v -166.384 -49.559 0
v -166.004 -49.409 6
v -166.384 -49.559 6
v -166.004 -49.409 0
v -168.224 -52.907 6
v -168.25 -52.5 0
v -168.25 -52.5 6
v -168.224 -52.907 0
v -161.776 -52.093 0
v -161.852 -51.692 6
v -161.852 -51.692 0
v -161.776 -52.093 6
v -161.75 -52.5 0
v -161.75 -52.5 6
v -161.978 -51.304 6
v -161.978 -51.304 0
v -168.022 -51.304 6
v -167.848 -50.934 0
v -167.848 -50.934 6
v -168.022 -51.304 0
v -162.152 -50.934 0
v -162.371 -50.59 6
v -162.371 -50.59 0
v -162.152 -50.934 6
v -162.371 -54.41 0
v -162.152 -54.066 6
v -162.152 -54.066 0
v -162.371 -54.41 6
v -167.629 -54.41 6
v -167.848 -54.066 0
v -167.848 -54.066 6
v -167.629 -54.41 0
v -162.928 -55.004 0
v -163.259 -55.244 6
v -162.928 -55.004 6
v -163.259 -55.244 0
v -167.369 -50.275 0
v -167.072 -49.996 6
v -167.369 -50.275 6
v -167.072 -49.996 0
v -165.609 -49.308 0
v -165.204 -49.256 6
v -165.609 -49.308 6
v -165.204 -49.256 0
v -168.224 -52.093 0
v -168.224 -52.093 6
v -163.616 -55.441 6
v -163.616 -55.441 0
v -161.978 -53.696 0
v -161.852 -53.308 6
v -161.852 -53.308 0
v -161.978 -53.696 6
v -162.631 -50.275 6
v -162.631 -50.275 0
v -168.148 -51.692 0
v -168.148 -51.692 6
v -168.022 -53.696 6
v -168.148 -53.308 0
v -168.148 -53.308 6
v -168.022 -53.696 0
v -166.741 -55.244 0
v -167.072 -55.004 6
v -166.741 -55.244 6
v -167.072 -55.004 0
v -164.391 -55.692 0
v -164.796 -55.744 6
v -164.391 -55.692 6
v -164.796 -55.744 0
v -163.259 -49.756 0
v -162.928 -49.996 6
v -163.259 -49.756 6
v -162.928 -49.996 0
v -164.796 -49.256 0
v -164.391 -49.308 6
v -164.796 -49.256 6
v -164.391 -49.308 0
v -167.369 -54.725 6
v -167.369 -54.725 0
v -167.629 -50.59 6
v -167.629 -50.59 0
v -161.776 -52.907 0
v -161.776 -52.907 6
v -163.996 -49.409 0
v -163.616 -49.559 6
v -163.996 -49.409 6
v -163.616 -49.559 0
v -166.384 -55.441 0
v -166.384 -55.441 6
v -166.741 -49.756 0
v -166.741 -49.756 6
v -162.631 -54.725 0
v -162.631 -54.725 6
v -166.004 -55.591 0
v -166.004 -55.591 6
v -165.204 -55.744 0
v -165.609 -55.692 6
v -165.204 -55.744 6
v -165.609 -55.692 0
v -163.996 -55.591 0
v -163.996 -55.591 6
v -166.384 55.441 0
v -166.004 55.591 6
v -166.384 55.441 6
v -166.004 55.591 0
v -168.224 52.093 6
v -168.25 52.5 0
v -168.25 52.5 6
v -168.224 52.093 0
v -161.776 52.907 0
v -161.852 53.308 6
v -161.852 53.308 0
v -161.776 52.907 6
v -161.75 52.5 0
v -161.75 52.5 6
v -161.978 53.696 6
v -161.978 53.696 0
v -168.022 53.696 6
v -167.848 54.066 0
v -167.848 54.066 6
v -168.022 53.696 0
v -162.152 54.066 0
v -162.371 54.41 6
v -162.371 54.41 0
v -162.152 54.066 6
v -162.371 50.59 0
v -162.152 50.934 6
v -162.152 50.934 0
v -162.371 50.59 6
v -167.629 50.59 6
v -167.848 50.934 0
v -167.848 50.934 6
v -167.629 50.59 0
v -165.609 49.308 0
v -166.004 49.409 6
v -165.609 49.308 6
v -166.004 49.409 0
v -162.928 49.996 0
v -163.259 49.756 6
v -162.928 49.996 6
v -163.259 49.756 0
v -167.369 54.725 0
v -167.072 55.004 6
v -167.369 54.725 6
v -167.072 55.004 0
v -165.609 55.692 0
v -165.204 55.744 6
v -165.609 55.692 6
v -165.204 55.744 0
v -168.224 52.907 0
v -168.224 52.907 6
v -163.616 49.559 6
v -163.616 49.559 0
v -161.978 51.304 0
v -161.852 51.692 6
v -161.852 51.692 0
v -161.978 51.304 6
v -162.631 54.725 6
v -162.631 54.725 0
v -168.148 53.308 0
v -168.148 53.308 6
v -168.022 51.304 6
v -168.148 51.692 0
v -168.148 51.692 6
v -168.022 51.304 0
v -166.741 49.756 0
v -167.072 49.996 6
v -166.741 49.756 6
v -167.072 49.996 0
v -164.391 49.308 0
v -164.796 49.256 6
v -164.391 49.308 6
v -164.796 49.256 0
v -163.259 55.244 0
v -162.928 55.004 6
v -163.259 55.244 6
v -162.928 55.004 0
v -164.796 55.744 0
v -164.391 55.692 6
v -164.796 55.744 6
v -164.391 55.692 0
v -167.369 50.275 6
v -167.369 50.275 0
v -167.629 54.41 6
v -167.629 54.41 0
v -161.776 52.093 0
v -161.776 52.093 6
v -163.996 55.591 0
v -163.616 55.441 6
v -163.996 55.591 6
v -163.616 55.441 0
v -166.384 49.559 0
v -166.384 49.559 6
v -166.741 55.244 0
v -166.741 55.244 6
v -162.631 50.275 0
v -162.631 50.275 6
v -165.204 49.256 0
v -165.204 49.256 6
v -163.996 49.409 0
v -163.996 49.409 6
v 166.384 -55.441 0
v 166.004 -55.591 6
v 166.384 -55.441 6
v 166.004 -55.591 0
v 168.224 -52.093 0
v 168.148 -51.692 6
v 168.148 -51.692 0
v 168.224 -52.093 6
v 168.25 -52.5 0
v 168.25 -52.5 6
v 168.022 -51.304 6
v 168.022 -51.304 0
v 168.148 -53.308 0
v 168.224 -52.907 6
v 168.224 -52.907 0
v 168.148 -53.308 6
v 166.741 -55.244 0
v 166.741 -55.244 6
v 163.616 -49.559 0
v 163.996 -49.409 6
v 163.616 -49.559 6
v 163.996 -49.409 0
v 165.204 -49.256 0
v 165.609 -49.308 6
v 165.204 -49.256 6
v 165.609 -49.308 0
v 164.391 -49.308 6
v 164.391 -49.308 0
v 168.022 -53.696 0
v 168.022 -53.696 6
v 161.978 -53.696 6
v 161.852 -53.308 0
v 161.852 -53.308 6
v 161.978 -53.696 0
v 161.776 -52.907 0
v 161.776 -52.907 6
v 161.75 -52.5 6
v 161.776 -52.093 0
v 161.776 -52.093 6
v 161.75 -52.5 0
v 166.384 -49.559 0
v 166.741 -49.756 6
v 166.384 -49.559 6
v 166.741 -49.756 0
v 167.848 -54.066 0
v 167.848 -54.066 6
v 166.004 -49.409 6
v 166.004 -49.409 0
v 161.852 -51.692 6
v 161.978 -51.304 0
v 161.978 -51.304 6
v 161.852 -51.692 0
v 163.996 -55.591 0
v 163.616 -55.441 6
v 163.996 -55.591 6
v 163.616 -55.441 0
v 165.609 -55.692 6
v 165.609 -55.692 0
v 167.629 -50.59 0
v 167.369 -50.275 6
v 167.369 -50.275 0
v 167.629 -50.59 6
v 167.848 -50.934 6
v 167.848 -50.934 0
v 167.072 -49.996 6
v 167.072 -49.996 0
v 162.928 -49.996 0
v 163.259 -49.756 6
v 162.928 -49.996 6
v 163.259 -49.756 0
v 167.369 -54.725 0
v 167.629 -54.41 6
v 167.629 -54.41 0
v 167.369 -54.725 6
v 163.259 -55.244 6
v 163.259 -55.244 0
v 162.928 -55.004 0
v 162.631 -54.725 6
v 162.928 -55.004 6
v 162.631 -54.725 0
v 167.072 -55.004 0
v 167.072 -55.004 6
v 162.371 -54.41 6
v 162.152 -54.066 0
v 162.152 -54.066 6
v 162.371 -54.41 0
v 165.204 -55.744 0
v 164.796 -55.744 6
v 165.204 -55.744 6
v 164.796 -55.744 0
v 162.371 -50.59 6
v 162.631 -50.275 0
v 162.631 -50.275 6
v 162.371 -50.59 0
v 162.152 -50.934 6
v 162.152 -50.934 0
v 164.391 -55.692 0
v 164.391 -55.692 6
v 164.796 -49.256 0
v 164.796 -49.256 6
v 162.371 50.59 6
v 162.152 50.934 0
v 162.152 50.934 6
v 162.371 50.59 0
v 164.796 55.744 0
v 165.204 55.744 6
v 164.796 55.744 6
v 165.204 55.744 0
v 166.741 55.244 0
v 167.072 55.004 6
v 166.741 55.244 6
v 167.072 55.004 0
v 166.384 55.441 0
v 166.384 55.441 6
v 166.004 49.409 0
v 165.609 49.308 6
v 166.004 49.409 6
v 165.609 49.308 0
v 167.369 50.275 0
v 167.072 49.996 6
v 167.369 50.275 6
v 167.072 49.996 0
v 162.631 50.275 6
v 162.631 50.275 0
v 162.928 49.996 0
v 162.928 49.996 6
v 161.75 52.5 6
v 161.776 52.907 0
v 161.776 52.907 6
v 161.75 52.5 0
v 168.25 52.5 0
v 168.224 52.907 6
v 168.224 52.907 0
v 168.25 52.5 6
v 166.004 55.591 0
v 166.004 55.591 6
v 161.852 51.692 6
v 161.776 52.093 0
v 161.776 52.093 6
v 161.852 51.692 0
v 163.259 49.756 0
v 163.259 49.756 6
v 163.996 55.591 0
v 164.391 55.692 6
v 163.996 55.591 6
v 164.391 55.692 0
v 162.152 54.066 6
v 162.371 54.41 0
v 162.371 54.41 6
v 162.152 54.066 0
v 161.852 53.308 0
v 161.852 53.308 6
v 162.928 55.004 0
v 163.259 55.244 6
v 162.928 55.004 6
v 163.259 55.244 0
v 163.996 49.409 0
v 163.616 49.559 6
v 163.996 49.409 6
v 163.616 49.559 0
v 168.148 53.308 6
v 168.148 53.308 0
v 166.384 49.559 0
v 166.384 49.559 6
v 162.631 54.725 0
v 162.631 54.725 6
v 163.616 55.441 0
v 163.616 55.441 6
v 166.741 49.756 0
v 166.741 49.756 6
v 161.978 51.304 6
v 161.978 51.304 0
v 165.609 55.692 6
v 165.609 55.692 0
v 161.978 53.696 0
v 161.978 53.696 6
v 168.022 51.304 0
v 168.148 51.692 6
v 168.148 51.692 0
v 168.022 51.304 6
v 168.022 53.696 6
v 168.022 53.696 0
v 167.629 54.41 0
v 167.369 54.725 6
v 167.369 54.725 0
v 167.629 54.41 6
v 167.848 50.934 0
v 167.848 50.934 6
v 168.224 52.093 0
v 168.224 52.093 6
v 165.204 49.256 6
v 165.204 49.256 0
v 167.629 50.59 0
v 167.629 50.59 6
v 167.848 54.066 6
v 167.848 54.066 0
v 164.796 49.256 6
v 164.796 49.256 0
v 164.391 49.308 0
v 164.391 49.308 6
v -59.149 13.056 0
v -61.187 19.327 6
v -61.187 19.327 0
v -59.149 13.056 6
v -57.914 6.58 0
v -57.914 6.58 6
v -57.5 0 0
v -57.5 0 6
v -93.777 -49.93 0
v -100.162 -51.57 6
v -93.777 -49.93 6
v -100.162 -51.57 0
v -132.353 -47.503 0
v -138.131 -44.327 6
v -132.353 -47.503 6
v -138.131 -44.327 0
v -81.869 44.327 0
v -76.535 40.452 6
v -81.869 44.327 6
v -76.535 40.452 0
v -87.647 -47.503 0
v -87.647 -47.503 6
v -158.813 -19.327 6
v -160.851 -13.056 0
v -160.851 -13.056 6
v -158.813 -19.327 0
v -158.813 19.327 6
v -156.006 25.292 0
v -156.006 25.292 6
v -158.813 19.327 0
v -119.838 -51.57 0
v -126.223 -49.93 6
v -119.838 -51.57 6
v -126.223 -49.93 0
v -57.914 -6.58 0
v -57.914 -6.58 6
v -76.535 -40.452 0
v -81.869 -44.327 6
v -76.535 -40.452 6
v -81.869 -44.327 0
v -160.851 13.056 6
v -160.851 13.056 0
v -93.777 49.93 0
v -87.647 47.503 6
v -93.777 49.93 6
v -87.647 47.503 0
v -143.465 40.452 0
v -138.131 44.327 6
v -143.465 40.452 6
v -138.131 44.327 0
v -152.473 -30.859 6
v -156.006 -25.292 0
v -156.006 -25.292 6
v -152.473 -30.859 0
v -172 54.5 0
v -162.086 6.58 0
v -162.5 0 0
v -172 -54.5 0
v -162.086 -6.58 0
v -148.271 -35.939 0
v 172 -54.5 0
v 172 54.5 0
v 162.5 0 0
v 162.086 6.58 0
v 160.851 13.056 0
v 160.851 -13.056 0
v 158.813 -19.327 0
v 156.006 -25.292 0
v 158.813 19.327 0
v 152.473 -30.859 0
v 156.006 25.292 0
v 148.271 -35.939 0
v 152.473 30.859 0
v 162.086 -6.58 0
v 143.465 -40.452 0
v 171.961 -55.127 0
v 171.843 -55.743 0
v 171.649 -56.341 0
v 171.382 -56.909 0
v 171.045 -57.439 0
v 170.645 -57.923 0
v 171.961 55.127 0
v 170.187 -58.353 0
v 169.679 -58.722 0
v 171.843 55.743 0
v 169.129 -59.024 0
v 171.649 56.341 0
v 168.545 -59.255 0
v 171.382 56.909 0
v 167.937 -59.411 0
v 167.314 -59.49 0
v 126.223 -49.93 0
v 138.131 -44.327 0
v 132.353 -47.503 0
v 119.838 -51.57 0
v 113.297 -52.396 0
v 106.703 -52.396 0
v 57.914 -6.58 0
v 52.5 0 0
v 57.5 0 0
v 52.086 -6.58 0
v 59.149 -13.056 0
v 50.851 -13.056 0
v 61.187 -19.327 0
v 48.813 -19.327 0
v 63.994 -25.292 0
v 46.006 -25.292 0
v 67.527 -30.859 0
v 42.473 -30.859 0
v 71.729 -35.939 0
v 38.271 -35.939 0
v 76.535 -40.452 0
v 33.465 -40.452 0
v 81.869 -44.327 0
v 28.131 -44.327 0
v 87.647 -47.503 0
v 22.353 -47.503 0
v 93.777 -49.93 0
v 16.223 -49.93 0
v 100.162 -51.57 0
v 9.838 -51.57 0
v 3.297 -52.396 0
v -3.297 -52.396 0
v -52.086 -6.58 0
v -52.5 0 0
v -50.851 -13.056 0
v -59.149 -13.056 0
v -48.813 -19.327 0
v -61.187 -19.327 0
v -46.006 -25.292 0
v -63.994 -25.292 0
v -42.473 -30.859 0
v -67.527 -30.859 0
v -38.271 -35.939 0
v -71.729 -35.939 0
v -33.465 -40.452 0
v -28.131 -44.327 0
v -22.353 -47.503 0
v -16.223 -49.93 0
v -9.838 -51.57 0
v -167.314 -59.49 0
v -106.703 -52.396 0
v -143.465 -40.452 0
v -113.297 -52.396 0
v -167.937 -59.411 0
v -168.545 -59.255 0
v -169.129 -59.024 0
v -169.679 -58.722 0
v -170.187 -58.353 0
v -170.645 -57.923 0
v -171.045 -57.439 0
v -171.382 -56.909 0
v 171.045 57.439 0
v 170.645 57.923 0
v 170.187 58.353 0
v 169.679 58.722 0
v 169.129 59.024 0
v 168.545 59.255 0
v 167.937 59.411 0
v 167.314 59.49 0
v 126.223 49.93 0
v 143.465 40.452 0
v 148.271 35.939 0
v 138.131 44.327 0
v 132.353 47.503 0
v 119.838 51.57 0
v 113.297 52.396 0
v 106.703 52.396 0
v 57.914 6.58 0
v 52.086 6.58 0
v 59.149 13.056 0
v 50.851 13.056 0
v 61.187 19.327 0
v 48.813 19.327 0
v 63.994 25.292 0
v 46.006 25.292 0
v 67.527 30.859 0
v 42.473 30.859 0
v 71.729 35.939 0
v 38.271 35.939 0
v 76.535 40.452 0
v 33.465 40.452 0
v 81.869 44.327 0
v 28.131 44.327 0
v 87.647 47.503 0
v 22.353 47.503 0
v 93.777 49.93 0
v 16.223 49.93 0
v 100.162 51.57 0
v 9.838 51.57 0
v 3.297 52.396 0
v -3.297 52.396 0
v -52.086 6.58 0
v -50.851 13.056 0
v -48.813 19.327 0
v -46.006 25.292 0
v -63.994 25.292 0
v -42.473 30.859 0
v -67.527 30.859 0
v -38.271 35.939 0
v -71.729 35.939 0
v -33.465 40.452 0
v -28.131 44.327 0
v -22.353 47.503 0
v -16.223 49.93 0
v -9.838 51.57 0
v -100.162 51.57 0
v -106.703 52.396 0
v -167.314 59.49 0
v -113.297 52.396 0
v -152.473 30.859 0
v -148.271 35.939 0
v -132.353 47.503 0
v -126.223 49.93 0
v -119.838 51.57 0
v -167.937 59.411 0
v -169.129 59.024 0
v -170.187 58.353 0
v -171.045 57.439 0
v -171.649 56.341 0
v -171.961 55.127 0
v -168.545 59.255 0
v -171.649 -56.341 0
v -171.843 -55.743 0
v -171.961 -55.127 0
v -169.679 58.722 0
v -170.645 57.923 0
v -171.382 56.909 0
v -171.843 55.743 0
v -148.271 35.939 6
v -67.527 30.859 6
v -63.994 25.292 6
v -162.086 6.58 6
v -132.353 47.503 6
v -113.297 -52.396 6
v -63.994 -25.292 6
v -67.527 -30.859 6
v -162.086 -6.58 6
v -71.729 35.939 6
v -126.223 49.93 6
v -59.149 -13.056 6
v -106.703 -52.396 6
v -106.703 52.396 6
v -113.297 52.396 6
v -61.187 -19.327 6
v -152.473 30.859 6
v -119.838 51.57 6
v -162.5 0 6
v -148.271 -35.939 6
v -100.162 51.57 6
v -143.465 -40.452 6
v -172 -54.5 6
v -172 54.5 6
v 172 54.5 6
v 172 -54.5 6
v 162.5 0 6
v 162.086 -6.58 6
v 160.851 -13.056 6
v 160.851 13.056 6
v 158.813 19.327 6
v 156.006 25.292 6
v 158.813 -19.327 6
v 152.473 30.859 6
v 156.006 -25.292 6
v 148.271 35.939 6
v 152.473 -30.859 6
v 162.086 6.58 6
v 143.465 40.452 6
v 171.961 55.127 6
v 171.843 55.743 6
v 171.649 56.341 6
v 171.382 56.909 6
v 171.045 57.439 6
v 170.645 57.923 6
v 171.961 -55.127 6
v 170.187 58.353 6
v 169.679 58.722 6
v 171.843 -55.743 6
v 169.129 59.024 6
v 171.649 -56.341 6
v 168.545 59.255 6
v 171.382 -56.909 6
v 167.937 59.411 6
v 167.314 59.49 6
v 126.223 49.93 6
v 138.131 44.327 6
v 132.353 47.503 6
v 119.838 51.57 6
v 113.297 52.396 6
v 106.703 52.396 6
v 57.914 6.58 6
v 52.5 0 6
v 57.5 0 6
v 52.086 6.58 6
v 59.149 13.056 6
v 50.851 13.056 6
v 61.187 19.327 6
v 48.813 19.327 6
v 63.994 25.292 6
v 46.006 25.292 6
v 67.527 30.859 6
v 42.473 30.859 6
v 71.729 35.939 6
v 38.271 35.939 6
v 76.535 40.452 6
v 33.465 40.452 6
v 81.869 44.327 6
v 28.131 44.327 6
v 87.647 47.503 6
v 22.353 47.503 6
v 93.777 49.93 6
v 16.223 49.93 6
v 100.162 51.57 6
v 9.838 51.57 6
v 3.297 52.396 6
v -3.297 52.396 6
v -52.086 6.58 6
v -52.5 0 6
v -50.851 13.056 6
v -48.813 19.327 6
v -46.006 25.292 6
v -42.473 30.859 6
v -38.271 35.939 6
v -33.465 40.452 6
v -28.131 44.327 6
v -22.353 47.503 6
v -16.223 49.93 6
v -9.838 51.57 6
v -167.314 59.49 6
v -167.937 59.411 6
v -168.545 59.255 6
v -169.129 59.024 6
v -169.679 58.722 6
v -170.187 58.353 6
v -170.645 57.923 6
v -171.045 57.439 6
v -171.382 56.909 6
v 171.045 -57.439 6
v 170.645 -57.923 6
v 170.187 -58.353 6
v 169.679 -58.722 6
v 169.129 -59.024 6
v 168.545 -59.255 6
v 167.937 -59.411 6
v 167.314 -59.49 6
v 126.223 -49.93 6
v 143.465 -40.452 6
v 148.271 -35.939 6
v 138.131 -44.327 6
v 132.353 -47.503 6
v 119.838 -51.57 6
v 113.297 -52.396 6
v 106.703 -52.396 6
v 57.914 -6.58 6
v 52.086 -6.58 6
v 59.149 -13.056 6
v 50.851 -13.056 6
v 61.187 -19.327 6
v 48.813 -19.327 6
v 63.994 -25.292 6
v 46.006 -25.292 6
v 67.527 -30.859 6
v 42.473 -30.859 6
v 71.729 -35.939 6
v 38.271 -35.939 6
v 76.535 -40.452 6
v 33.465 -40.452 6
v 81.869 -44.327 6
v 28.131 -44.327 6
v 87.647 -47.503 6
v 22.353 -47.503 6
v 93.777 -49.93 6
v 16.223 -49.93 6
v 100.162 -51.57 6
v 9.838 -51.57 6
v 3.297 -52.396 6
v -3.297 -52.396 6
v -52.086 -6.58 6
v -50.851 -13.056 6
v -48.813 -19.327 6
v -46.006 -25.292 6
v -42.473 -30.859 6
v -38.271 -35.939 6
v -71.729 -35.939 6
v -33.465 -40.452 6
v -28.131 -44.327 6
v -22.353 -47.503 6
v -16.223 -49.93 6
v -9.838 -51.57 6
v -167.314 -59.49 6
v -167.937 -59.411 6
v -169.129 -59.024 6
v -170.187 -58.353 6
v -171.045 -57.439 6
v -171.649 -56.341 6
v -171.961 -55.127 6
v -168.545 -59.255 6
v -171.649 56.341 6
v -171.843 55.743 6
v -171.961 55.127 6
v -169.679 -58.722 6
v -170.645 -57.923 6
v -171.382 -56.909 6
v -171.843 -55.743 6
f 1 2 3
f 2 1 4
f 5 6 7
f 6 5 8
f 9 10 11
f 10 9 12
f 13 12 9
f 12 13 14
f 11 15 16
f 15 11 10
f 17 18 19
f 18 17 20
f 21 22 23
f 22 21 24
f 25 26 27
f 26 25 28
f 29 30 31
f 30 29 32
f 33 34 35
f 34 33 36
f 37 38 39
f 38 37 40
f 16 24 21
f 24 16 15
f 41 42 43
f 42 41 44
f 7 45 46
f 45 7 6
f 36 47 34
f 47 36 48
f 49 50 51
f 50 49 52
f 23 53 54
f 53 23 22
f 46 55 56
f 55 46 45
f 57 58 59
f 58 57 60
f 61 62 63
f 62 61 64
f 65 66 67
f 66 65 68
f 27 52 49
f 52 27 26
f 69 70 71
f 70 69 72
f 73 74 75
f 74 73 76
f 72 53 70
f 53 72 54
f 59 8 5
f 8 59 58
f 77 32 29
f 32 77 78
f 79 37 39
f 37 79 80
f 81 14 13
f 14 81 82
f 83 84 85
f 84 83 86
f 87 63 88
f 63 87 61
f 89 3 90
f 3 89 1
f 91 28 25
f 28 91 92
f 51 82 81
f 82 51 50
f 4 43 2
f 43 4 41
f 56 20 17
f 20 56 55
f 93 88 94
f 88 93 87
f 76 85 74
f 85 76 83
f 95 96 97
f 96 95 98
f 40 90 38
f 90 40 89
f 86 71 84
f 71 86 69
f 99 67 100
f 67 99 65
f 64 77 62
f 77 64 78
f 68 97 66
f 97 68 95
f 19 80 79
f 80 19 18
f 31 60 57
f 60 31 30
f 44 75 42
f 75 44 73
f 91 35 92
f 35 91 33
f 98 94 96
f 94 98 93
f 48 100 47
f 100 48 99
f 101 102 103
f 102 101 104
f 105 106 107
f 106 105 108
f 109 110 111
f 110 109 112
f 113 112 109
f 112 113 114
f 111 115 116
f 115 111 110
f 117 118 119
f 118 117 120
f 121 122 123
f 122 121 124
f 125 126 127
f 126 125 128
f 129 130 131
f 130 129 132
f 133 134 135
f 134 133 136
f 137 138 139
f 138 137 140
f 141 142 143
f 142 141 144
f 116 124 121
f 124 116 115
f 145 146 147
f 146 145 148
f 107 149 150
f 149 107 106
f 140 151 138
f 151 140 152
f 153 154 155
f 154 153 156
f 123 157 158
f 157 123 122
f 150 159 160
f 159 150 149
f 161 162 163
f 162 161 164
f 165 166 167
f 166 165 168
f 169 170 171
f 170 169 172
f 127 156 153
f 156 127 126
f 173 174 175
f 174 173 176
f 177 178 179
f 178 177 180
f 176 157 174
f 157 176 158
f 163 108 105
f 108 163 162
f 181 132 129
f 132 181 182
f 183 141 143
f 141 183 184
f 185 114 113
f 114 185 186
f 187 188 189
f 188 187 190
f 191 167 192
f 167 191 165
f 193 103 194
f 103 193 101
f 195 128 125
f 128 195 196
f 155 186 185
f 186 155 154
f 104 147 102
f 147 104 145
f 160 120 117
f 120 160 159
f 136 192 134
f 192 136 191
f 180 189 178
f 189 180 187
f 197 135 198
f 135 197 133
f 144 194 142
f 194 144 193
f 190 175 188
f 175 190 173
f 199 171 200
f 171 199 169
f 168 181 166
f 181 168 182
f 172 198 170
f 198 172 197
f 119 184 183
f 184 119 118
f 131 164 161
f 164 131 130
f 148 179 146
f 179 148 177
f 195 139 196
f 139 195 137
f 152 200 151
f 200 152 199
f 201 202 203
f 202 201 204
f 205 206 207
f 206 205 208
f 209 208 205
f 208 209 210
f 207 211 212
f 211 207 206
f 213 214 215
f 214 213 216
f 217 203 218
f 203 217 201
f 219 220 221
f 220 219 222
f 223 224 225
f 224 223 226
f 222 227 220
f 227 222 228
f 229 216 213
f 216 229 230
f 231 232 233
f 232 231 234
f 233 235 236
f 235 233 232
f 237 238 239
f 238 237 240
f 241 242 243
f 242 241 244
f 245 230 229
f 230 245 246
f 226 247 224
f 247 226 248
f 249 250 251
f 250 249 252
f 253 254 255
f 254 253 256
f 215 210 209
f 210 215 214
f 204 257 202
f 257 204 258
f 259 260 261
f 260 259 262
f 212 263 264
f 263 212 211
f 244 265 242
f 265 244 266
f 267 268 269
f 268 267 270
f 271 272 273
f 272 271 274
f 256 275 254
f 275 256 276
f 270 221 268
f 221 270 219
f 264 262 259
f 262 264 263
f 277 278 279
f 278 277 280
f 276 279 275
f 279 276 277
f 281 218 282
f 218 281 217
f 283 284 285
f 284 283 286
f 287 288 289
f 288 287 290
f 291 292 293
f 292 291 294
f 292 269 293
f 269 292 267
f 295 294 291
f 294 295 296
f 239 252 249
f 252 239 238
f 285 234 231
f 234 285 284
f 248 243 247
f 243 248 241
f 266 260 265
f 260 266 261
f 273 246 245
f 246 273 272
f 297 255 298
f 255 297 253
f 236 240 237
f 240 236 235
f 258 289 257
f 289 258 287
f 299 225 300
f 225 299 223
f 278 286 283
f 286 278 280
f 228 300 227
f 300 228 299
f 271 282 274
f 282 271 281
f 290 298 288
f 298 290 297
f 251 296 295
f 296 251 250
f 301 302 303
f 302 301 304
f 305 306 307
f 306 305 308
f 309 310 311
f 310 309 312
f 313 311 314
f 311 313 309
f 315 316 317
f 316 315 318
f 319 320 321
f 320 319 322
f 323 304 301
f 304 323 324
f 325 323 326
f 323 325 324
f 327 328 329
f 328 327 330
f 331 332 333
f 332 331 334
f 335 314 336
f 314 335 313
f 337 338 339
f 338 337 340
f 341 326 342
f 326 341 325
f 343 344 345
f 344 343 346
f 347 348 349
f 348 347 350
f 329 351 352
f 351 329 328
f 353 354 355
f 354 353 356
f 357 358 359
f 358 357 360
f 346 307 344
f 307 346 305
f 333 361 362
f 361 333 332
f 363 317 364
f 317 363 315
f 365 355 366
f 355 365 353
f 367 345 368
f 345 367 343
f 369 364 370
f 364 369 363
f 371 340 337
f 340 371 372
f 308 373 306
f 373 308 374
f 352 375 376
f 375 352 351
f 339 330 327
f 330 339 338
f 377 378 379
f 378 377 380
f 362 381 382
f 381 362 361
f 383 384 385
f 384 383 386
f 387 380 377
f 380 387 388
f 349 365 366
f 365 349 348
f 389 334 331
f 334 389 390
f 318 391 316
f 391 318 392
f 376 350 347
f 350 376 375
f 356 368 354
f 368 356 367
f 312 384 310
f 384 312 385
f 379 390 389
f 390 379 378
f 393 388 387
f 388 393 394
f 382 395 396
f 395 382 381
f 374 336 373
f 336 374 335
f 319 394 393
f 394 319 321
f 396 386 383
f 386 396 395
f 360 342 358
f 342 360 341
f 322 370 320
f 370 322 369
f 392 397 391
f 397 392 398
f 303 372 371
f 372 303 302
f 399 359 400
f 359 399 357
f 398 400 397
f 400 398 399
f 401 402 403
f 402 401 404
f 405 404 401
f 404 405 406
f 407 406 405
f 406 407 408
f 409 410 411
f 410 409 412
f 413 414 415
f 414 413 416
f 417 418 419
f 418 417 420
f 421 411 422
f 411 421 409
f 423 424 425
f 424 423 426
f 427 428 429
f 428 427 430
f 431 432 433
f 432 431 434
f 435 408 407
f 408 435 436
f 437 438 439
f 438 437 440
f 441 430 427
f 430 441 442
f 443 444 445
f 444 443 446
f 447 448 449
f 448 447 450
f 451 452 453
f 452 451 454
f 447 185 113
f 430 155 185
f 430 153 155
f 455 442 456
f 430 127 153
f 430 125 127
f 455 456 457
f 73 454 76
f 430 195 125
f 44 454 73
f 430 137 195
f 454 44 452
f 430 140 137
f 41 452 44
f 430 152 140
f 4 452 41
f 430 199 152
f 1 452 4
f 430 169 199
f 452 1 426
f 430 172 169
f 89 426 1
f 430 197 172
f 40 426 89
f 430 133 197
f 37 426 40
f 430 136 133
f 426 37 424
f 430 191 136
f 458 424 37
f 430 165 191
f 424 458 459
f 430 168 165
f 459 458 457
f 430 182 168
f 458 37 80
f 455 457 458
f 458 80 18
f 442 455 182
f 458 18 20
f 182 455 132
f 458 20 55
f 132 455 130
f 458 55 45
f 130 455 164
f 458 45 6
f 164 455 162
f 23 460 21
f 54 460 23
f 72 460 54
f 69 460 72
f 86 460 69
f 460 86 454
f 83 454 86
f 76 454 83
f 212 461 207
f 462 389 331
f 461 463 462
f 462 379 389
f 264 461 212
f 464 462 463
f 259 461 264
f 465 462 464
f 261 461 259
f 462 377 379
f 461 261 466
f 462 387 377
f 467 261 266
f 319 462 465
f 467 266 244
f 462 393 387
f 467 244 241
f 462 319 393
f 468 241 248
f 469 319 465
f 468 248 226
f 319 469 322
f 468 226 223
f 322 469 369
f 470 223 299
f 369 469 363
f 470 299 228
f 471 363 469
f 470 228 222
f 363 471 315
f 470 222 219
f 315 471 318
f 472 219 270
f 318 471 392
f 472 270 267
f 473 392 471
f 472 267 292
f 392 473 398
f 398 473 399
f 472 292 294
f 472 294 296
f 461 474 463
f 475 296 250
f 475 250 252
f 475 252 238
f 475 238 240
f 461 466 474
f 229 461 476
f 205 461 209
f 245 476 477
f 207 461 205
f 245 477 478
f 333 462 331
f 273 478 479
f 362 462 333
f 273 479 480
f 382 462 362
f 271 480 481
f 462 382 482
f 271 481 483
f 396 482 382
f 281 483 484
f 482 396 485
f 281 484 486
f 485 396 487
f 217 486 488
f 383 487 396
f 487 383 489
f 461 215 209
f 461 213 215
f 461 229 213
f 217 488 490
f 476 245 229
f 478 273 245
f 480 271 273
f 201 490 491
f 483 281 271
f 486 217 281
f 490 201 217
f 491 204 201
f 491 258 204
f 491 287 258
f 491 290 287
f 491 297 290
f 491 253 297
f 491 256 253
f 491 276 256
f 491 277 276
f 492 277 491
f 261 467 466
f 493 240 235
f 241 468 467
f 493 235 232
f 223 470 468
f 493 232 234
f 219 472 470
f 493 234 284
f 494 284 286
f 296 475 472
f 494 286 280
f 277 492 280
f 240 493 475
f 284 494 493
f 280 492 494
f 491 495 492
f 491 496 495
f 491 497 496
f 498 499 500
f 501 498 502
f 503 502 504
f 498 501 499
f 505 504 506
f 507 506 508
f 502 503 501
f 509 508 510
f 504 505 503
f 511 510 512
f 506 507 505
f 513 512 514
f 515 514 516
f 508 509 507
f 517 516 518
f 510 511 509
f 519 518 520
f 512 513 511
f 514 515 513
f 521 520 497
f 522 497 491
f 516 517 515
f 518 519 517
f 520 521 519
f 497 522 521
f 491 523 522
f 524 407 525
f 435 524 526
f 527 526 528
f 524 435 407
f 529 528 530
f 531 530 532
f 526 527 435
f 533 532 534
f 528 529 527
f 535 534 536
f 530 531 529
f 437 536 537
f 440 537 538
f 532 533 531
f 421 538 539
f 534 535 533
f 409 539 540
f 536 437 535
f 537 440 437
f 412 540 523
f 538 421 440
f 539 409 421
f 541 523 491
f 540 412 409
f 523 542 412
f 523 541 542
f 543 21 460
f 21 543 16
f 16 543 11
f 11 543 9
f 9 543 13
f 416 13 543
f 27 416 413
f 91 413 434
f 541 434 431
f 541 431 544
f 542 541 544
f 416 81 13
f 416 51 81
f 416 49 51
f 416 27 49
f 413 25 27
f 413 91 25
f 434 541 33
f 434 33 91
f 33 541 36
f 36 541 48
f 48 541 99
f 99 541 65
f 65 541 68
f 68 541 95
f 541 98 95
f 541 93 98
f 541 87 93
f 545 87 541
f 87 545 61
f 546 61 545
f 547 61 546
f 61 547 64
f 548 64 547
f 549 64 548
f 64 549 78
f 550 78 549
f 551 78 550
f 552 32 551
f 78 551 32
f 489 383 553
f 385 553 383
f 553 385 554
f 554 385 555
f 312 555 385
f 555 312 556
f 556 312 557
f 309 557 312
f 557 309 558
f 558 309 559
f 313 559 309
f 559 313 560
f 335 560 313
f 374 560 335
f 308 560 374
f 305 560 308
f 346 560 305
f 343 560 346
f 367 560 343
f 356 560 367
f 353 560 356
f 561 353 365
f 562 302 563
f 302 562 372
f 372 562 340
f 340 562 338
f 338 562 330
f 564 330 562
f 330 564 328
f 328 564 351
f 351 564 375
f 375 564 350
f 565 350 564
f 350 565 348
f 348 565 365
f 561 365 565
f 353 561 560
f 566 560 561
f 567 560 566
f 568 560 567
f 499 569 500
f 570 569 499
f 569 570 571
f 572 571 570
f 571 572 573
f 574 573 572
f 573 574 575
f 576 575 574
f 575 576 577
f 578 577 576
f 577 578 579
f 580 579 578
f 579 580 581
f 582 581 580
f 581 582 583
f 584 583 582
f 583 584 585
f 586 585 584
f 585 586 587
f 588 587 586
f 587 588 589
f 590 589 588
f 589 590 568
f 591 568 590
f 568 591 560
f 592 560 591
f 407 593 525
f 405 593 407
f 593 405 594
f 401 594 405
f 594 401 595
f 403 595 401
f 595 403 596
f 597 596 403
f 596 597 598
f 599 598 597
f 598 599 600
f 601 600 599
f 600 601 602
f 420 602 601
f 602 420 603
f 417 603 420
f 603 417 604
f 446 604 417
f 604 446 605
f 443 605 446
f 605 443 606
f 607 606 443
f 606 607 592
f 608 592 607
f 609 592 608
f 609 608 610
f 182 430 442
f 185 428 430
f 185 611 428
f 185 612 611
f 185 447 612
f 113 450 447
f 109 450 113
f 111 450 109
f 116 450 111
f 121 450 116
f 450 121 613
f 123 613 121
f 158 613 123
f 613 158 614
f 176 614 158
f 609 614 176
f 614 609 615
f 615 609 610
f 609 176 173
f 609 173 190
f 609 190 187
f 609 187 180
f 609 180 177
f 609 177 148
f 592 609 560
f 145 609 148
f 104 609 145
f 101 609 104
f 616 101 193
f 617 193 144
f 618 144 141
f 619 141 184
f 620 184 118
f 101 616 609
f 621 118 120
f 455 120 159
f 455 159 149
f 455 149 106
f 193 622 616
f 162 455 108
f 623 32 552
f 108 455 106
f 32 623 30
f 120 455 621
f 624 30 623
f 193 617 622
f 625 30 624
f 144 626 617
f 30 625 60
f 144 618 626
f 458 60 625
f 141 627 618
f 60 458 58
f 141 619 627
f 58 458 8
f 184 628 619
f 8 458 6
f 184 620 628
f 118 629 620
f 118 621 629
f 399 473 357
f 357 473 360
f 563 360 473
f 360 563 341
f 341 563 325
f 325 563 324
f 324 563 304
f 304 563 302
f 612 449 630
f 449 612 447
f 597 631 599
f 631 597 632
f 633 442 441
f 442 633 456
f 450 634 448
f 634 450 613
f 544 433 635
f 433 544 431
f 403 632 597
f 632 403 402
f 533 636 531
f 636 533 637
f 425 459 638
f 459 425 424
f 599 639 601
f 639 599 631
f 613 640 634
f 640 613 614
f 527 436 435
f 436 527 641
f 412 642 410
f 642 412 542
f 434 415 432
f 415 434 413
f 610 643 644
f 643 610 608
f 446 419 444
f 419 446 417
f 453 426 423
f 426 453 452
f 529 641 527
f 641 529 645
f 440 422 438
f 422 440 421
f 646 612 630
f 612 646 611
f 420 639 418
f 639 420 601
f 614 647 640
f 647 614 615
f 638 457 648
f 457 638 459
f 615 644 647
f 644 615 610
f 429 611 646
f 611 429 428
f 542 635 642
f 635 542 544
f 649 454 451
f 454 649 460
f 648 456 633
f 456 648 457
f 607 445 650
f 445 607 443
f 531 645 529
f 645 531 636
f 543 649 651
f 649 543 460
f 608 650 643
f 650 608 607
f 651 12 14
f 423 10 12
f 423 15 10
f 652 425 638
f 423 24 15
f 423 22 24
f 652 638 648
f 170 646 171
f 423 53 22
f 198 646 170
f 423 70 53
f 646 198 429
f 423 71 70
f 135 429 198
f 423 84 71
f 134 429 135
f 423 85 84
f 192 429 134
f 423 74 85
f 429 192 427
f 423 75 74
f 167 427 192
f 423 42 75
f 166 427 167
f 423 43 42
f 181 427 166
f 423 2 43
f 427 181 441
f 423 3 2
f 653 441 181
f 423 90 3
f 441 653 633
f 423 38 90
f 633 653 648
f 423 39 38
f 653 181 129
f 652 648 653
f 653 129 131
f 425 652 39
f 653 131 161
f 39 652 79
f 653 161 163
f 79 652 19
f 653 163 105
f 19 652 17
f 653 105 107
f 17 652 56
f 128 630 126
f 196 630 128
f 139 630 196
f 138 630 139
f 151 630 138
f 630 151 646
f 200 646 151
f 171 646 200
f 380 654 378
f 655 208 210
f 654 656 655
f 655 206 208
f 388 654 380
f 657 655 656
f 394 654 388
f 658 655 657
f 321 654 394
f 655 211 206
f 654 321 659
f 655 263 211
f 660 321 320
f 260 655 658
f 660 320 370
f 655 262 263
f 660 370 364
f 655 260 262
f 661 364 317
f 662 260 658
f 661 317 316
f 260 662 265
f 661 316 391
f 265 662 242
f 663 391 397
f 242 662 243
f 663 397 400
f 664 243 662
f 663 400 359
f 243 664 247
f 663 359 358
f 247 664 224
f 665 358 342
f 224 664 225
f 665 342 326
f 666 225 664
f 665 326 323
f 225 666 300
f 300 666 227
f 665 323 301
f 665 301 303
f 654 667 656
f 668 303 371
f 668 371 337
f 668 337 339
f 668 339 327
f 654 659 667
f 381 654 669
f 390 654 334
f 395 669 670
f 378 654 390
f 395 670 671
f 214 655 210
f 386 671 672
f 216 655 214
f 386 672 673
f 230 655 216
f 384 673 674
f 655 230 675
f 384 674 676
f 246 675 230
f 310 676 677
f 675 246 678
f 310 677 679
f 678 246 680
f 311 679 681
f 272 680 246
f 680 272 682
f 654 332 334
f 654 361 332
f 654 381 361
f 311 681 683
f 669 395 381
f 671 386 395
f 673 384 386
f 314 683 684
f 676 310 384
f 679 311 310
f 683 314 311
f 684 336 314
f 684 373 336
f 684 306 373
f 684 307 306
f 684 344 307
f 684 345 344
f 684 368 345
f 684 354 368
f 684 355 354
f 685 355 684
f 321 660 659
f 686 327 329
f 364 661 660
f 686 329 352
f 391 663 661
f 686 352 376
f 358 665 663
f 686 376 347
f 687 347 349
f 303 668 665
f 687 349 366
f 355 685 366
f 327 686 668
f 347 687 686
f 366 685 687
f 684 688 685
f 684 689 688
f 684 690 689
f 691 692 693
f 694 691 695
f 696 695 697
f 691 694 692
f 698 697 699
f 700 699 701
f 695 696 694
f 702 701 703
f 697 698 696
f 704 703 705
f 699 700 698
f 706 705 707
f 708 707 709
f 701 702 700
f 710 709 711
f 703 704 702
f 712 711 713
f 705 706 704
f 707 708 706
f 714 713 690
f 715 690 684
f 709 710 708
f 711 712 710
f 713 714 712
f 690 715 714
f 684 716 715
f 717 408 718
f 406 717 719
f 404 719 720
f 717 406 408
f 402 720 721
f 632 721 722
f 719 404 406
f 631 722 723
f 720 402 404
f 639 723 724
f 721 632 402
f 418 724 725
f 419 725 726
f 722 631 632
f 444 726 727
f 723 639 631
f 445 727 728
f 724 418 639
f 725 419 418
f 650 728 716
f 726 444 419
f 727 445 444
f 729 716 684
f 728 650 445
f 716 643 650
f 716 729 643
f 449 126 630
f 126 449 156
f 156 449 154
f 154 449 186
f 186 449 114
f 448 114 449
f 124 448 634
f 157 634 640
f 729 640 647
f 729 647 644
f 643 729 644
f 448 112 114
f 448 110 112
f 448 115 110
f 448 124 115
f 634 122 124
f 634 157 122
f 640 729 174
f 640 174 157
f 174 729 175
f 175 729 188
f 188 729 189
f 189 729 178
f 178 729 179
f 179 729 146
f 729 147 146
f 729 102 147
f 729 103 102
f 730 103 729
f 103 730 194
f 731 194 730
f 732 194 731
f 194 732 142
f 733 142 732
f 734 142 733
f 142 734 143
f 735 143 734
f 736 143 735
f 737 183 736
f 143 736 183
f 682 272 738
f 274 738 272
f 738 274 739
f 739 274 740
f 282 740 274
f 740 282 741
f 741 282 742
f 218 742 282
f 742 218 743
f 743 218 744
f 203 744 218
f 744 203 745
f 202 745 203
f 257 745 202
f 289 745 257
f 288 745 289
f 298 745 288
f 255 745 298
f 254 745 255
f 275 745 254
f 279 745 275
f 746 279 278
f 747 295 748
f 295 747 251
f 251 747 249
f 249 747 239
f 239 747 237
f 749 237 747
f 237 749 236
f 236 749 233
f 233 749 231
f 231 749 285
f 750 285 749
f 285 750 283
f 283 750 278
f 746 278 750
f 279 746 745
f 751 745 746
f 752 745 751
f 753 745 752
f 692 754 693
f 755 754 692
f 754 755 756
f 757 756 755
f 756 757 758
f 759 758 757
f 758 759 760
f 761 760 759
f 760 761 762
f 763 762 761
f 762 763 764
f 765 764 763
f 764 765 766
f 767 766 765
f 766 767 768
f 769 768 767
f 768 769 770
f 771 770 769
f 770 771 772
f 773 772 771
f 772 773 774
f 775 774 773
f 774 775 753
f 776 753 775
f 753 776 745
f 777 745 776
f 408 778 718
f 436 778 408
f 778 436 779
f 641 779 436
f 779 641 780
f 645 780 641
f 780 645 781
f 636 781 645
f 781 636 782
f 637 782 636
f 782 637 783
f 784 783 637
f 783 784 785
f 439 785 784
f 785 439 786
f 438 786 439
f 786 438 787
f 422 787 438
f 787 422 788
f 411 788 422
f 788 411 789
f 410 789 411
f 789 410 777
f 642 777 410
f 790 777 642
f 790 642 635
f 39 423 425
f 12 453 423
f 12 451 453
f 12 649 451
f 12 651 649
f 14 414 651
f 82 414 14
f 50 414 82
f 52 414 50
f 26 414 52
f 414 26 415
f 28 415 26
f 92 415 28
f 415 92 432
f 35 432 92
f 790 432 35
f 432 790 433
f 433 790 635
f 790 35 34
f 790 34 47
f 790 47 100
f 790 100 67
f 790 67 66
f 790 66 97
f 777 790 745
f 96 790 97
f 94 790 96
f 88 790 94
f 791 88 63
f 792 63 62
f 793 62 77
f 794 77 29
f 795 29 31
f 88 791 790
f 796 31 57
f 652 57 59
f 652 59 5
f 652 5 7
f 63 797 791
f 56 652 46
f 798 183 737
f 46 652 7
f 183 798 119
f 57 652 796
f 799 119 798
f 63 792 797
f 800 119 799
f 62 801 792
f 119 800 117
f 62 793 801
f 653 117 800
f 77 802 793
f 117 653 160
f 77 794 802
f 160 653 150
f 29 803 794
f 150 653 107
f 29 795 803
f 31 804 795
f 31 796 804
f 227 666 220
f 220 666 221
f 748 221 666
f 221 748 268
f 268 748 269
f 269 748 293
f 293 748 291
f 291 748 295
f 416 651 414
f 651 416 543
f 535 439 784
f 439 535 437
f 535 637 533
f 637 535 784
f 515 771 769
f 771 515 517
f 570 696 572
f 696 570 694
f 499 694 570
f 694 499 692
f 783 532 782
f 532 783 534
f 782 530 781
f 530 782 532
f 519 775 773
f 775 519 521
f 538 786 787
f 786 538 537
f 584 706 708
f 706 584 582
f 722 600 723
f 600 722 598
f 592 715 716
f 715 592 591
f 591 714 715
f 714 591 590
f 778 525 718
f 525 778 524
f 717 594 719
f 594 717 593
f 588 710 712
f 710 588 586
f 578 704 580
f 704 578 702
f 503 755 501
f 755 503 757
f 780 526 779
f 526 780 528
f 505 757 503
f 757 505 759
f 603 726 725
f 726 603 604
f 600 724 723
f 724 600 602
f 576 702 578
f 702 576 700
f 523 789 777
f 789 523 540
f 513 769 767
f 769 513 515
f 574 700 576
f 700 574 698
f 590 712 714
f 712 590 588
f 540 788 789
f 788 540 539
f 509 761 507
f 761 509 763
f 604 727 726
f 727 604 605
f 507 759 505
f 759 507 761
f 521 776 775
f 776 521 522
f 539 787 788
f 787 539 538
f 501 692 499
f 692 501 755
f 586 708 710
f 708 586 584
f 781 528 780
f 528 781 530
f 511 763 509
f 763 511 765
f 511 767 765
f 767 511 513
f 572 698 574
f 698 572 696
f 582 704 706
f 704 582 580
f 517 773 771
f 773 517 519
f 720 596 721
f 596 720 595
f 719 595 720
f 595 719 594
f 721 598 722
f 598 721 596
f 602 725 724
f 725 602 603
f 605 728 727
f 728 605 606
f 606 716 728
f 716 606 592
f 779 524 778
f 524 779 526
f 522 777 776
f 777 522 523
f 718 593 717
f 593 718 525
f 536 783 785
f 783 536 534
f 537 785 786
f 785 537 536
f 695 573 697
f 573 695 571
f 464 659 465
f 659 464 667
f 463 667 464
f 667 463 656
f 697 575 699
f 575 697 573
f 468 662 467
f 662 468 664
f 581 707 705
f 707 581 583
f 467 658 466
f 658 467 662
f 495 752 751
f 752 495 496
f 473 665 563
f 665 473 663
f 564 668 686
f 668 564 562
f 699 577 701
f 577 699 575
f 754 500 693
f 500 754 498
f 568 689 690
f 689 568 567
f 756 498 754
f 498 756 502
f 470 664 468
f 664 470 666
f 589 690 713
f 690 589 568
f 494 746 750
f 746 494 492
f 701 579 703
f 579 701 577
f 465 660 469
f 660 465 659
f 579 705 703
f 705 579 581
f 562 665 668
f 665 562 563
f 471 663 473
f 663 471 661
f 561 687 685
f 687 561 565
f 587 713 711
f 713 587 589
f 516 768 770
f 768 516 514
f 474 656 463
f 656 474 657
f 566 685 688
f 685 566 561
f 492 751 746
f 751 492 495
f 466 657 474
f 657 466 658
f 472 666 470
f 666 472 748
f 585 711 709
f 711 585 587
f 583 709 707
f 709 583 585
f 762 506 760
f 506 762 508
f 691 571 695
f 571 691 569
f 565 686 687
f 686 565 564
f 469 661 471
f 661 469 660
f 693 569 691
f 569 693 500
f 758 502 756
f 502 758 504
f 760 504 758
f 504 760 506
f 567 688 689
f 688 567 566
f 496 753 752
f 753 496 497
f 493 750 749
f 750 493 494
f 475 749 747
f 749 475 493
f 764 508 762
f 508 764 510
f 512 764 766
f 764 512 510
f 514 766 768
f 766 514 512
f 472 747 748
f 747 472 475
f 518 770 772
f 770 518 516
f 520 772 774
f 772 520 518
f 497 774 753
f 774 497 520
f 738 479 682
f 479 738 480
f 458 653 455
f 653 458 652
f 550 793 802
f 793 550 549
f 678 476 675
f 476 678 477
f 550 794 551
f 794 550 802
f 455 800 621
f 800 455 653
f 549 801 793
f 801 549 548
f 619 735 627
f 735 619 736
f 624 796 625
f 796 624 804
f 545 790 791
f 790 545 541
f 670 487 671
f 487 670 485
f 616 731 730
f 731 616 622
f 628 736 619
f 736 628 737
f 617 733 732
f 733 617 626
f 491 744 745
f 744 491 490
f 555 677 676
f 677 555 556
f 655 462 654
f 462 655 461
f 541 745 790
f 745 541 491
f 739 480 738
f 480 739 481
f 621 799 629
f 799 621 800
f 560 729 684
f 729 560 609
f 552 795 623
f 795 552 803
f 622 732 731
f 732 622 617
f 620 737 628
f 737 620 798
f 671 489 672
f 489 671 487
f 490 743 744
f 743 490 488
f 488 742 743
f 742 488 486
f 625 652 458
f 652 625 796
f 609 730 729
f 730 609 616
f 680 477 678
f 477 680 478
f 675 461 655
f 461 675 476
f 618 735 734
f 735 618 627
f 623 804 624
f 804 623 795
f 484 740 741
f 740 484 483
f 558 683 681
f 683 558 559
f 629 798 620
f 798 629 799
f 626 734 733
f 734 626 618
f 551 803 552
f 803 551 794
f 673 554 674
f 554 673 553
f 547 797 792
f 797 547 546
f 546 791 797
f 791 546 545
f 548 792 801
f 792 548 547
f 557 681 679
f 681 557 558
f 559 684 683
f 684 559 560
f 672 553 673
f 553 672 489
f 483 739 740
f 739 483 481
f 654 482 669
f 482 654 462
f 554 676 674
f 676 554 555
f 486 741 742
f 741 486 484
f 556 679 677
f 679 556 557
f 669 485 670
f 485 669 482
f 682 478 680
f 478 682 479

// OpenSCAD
$fn = 50;


difference() {
	union() {
		hull() {
			translate(v = [-167.0000000000, 54.5000000000, 0]) {
				cylinder(h = 6, r = 5);
			}
			translate(v = [167.0000000000, 54.5000000000, 0]) {
				cylinder(h = 6, r = 5);
			}
			translate(v = [-167.0000000000, -54.5000000000, 0]) {
				cylinder(h = 6, r = 5);
			}
			translate(v = [167.0000000000, -54.5000000000, 0]) {
				cylinder(h = 6, r = 5);
			}
		}
	}
	union() {
		#translate(v = [-165.0000000000, -52.5000000000, -100.0000000000]) {
			cylinder(h = 200, r = 3.2500000000);
		}
		#translate(v = [-165.0000000000, 52.5000000000, -100.0000000000]) {
			cylinder(h = 200, r = 3.2500000000);
		}
		#translate(v = [165.0000000000, -52.5000000000, -100.0000000000]) {
			cylinder(h = 200, r = 3.2500000000);
		}
		#translate(v = [165.0000000000, 52.5000000000, -100.0000000000]) {
			cylinder(h = 200, r = 3.2500000000);
		}
		#translate(v = [-110.0000000000, 0, 0]) {
			cylinder(h = 6, r = 52.5000000000);
		}
		#cylinder(h = 6, r = 52.5000000000);
		#translate(v = [110.0000000000, 0, 0]) {
			cylinder(h = 6, r = 52.5000000000);
		}
	}
}
